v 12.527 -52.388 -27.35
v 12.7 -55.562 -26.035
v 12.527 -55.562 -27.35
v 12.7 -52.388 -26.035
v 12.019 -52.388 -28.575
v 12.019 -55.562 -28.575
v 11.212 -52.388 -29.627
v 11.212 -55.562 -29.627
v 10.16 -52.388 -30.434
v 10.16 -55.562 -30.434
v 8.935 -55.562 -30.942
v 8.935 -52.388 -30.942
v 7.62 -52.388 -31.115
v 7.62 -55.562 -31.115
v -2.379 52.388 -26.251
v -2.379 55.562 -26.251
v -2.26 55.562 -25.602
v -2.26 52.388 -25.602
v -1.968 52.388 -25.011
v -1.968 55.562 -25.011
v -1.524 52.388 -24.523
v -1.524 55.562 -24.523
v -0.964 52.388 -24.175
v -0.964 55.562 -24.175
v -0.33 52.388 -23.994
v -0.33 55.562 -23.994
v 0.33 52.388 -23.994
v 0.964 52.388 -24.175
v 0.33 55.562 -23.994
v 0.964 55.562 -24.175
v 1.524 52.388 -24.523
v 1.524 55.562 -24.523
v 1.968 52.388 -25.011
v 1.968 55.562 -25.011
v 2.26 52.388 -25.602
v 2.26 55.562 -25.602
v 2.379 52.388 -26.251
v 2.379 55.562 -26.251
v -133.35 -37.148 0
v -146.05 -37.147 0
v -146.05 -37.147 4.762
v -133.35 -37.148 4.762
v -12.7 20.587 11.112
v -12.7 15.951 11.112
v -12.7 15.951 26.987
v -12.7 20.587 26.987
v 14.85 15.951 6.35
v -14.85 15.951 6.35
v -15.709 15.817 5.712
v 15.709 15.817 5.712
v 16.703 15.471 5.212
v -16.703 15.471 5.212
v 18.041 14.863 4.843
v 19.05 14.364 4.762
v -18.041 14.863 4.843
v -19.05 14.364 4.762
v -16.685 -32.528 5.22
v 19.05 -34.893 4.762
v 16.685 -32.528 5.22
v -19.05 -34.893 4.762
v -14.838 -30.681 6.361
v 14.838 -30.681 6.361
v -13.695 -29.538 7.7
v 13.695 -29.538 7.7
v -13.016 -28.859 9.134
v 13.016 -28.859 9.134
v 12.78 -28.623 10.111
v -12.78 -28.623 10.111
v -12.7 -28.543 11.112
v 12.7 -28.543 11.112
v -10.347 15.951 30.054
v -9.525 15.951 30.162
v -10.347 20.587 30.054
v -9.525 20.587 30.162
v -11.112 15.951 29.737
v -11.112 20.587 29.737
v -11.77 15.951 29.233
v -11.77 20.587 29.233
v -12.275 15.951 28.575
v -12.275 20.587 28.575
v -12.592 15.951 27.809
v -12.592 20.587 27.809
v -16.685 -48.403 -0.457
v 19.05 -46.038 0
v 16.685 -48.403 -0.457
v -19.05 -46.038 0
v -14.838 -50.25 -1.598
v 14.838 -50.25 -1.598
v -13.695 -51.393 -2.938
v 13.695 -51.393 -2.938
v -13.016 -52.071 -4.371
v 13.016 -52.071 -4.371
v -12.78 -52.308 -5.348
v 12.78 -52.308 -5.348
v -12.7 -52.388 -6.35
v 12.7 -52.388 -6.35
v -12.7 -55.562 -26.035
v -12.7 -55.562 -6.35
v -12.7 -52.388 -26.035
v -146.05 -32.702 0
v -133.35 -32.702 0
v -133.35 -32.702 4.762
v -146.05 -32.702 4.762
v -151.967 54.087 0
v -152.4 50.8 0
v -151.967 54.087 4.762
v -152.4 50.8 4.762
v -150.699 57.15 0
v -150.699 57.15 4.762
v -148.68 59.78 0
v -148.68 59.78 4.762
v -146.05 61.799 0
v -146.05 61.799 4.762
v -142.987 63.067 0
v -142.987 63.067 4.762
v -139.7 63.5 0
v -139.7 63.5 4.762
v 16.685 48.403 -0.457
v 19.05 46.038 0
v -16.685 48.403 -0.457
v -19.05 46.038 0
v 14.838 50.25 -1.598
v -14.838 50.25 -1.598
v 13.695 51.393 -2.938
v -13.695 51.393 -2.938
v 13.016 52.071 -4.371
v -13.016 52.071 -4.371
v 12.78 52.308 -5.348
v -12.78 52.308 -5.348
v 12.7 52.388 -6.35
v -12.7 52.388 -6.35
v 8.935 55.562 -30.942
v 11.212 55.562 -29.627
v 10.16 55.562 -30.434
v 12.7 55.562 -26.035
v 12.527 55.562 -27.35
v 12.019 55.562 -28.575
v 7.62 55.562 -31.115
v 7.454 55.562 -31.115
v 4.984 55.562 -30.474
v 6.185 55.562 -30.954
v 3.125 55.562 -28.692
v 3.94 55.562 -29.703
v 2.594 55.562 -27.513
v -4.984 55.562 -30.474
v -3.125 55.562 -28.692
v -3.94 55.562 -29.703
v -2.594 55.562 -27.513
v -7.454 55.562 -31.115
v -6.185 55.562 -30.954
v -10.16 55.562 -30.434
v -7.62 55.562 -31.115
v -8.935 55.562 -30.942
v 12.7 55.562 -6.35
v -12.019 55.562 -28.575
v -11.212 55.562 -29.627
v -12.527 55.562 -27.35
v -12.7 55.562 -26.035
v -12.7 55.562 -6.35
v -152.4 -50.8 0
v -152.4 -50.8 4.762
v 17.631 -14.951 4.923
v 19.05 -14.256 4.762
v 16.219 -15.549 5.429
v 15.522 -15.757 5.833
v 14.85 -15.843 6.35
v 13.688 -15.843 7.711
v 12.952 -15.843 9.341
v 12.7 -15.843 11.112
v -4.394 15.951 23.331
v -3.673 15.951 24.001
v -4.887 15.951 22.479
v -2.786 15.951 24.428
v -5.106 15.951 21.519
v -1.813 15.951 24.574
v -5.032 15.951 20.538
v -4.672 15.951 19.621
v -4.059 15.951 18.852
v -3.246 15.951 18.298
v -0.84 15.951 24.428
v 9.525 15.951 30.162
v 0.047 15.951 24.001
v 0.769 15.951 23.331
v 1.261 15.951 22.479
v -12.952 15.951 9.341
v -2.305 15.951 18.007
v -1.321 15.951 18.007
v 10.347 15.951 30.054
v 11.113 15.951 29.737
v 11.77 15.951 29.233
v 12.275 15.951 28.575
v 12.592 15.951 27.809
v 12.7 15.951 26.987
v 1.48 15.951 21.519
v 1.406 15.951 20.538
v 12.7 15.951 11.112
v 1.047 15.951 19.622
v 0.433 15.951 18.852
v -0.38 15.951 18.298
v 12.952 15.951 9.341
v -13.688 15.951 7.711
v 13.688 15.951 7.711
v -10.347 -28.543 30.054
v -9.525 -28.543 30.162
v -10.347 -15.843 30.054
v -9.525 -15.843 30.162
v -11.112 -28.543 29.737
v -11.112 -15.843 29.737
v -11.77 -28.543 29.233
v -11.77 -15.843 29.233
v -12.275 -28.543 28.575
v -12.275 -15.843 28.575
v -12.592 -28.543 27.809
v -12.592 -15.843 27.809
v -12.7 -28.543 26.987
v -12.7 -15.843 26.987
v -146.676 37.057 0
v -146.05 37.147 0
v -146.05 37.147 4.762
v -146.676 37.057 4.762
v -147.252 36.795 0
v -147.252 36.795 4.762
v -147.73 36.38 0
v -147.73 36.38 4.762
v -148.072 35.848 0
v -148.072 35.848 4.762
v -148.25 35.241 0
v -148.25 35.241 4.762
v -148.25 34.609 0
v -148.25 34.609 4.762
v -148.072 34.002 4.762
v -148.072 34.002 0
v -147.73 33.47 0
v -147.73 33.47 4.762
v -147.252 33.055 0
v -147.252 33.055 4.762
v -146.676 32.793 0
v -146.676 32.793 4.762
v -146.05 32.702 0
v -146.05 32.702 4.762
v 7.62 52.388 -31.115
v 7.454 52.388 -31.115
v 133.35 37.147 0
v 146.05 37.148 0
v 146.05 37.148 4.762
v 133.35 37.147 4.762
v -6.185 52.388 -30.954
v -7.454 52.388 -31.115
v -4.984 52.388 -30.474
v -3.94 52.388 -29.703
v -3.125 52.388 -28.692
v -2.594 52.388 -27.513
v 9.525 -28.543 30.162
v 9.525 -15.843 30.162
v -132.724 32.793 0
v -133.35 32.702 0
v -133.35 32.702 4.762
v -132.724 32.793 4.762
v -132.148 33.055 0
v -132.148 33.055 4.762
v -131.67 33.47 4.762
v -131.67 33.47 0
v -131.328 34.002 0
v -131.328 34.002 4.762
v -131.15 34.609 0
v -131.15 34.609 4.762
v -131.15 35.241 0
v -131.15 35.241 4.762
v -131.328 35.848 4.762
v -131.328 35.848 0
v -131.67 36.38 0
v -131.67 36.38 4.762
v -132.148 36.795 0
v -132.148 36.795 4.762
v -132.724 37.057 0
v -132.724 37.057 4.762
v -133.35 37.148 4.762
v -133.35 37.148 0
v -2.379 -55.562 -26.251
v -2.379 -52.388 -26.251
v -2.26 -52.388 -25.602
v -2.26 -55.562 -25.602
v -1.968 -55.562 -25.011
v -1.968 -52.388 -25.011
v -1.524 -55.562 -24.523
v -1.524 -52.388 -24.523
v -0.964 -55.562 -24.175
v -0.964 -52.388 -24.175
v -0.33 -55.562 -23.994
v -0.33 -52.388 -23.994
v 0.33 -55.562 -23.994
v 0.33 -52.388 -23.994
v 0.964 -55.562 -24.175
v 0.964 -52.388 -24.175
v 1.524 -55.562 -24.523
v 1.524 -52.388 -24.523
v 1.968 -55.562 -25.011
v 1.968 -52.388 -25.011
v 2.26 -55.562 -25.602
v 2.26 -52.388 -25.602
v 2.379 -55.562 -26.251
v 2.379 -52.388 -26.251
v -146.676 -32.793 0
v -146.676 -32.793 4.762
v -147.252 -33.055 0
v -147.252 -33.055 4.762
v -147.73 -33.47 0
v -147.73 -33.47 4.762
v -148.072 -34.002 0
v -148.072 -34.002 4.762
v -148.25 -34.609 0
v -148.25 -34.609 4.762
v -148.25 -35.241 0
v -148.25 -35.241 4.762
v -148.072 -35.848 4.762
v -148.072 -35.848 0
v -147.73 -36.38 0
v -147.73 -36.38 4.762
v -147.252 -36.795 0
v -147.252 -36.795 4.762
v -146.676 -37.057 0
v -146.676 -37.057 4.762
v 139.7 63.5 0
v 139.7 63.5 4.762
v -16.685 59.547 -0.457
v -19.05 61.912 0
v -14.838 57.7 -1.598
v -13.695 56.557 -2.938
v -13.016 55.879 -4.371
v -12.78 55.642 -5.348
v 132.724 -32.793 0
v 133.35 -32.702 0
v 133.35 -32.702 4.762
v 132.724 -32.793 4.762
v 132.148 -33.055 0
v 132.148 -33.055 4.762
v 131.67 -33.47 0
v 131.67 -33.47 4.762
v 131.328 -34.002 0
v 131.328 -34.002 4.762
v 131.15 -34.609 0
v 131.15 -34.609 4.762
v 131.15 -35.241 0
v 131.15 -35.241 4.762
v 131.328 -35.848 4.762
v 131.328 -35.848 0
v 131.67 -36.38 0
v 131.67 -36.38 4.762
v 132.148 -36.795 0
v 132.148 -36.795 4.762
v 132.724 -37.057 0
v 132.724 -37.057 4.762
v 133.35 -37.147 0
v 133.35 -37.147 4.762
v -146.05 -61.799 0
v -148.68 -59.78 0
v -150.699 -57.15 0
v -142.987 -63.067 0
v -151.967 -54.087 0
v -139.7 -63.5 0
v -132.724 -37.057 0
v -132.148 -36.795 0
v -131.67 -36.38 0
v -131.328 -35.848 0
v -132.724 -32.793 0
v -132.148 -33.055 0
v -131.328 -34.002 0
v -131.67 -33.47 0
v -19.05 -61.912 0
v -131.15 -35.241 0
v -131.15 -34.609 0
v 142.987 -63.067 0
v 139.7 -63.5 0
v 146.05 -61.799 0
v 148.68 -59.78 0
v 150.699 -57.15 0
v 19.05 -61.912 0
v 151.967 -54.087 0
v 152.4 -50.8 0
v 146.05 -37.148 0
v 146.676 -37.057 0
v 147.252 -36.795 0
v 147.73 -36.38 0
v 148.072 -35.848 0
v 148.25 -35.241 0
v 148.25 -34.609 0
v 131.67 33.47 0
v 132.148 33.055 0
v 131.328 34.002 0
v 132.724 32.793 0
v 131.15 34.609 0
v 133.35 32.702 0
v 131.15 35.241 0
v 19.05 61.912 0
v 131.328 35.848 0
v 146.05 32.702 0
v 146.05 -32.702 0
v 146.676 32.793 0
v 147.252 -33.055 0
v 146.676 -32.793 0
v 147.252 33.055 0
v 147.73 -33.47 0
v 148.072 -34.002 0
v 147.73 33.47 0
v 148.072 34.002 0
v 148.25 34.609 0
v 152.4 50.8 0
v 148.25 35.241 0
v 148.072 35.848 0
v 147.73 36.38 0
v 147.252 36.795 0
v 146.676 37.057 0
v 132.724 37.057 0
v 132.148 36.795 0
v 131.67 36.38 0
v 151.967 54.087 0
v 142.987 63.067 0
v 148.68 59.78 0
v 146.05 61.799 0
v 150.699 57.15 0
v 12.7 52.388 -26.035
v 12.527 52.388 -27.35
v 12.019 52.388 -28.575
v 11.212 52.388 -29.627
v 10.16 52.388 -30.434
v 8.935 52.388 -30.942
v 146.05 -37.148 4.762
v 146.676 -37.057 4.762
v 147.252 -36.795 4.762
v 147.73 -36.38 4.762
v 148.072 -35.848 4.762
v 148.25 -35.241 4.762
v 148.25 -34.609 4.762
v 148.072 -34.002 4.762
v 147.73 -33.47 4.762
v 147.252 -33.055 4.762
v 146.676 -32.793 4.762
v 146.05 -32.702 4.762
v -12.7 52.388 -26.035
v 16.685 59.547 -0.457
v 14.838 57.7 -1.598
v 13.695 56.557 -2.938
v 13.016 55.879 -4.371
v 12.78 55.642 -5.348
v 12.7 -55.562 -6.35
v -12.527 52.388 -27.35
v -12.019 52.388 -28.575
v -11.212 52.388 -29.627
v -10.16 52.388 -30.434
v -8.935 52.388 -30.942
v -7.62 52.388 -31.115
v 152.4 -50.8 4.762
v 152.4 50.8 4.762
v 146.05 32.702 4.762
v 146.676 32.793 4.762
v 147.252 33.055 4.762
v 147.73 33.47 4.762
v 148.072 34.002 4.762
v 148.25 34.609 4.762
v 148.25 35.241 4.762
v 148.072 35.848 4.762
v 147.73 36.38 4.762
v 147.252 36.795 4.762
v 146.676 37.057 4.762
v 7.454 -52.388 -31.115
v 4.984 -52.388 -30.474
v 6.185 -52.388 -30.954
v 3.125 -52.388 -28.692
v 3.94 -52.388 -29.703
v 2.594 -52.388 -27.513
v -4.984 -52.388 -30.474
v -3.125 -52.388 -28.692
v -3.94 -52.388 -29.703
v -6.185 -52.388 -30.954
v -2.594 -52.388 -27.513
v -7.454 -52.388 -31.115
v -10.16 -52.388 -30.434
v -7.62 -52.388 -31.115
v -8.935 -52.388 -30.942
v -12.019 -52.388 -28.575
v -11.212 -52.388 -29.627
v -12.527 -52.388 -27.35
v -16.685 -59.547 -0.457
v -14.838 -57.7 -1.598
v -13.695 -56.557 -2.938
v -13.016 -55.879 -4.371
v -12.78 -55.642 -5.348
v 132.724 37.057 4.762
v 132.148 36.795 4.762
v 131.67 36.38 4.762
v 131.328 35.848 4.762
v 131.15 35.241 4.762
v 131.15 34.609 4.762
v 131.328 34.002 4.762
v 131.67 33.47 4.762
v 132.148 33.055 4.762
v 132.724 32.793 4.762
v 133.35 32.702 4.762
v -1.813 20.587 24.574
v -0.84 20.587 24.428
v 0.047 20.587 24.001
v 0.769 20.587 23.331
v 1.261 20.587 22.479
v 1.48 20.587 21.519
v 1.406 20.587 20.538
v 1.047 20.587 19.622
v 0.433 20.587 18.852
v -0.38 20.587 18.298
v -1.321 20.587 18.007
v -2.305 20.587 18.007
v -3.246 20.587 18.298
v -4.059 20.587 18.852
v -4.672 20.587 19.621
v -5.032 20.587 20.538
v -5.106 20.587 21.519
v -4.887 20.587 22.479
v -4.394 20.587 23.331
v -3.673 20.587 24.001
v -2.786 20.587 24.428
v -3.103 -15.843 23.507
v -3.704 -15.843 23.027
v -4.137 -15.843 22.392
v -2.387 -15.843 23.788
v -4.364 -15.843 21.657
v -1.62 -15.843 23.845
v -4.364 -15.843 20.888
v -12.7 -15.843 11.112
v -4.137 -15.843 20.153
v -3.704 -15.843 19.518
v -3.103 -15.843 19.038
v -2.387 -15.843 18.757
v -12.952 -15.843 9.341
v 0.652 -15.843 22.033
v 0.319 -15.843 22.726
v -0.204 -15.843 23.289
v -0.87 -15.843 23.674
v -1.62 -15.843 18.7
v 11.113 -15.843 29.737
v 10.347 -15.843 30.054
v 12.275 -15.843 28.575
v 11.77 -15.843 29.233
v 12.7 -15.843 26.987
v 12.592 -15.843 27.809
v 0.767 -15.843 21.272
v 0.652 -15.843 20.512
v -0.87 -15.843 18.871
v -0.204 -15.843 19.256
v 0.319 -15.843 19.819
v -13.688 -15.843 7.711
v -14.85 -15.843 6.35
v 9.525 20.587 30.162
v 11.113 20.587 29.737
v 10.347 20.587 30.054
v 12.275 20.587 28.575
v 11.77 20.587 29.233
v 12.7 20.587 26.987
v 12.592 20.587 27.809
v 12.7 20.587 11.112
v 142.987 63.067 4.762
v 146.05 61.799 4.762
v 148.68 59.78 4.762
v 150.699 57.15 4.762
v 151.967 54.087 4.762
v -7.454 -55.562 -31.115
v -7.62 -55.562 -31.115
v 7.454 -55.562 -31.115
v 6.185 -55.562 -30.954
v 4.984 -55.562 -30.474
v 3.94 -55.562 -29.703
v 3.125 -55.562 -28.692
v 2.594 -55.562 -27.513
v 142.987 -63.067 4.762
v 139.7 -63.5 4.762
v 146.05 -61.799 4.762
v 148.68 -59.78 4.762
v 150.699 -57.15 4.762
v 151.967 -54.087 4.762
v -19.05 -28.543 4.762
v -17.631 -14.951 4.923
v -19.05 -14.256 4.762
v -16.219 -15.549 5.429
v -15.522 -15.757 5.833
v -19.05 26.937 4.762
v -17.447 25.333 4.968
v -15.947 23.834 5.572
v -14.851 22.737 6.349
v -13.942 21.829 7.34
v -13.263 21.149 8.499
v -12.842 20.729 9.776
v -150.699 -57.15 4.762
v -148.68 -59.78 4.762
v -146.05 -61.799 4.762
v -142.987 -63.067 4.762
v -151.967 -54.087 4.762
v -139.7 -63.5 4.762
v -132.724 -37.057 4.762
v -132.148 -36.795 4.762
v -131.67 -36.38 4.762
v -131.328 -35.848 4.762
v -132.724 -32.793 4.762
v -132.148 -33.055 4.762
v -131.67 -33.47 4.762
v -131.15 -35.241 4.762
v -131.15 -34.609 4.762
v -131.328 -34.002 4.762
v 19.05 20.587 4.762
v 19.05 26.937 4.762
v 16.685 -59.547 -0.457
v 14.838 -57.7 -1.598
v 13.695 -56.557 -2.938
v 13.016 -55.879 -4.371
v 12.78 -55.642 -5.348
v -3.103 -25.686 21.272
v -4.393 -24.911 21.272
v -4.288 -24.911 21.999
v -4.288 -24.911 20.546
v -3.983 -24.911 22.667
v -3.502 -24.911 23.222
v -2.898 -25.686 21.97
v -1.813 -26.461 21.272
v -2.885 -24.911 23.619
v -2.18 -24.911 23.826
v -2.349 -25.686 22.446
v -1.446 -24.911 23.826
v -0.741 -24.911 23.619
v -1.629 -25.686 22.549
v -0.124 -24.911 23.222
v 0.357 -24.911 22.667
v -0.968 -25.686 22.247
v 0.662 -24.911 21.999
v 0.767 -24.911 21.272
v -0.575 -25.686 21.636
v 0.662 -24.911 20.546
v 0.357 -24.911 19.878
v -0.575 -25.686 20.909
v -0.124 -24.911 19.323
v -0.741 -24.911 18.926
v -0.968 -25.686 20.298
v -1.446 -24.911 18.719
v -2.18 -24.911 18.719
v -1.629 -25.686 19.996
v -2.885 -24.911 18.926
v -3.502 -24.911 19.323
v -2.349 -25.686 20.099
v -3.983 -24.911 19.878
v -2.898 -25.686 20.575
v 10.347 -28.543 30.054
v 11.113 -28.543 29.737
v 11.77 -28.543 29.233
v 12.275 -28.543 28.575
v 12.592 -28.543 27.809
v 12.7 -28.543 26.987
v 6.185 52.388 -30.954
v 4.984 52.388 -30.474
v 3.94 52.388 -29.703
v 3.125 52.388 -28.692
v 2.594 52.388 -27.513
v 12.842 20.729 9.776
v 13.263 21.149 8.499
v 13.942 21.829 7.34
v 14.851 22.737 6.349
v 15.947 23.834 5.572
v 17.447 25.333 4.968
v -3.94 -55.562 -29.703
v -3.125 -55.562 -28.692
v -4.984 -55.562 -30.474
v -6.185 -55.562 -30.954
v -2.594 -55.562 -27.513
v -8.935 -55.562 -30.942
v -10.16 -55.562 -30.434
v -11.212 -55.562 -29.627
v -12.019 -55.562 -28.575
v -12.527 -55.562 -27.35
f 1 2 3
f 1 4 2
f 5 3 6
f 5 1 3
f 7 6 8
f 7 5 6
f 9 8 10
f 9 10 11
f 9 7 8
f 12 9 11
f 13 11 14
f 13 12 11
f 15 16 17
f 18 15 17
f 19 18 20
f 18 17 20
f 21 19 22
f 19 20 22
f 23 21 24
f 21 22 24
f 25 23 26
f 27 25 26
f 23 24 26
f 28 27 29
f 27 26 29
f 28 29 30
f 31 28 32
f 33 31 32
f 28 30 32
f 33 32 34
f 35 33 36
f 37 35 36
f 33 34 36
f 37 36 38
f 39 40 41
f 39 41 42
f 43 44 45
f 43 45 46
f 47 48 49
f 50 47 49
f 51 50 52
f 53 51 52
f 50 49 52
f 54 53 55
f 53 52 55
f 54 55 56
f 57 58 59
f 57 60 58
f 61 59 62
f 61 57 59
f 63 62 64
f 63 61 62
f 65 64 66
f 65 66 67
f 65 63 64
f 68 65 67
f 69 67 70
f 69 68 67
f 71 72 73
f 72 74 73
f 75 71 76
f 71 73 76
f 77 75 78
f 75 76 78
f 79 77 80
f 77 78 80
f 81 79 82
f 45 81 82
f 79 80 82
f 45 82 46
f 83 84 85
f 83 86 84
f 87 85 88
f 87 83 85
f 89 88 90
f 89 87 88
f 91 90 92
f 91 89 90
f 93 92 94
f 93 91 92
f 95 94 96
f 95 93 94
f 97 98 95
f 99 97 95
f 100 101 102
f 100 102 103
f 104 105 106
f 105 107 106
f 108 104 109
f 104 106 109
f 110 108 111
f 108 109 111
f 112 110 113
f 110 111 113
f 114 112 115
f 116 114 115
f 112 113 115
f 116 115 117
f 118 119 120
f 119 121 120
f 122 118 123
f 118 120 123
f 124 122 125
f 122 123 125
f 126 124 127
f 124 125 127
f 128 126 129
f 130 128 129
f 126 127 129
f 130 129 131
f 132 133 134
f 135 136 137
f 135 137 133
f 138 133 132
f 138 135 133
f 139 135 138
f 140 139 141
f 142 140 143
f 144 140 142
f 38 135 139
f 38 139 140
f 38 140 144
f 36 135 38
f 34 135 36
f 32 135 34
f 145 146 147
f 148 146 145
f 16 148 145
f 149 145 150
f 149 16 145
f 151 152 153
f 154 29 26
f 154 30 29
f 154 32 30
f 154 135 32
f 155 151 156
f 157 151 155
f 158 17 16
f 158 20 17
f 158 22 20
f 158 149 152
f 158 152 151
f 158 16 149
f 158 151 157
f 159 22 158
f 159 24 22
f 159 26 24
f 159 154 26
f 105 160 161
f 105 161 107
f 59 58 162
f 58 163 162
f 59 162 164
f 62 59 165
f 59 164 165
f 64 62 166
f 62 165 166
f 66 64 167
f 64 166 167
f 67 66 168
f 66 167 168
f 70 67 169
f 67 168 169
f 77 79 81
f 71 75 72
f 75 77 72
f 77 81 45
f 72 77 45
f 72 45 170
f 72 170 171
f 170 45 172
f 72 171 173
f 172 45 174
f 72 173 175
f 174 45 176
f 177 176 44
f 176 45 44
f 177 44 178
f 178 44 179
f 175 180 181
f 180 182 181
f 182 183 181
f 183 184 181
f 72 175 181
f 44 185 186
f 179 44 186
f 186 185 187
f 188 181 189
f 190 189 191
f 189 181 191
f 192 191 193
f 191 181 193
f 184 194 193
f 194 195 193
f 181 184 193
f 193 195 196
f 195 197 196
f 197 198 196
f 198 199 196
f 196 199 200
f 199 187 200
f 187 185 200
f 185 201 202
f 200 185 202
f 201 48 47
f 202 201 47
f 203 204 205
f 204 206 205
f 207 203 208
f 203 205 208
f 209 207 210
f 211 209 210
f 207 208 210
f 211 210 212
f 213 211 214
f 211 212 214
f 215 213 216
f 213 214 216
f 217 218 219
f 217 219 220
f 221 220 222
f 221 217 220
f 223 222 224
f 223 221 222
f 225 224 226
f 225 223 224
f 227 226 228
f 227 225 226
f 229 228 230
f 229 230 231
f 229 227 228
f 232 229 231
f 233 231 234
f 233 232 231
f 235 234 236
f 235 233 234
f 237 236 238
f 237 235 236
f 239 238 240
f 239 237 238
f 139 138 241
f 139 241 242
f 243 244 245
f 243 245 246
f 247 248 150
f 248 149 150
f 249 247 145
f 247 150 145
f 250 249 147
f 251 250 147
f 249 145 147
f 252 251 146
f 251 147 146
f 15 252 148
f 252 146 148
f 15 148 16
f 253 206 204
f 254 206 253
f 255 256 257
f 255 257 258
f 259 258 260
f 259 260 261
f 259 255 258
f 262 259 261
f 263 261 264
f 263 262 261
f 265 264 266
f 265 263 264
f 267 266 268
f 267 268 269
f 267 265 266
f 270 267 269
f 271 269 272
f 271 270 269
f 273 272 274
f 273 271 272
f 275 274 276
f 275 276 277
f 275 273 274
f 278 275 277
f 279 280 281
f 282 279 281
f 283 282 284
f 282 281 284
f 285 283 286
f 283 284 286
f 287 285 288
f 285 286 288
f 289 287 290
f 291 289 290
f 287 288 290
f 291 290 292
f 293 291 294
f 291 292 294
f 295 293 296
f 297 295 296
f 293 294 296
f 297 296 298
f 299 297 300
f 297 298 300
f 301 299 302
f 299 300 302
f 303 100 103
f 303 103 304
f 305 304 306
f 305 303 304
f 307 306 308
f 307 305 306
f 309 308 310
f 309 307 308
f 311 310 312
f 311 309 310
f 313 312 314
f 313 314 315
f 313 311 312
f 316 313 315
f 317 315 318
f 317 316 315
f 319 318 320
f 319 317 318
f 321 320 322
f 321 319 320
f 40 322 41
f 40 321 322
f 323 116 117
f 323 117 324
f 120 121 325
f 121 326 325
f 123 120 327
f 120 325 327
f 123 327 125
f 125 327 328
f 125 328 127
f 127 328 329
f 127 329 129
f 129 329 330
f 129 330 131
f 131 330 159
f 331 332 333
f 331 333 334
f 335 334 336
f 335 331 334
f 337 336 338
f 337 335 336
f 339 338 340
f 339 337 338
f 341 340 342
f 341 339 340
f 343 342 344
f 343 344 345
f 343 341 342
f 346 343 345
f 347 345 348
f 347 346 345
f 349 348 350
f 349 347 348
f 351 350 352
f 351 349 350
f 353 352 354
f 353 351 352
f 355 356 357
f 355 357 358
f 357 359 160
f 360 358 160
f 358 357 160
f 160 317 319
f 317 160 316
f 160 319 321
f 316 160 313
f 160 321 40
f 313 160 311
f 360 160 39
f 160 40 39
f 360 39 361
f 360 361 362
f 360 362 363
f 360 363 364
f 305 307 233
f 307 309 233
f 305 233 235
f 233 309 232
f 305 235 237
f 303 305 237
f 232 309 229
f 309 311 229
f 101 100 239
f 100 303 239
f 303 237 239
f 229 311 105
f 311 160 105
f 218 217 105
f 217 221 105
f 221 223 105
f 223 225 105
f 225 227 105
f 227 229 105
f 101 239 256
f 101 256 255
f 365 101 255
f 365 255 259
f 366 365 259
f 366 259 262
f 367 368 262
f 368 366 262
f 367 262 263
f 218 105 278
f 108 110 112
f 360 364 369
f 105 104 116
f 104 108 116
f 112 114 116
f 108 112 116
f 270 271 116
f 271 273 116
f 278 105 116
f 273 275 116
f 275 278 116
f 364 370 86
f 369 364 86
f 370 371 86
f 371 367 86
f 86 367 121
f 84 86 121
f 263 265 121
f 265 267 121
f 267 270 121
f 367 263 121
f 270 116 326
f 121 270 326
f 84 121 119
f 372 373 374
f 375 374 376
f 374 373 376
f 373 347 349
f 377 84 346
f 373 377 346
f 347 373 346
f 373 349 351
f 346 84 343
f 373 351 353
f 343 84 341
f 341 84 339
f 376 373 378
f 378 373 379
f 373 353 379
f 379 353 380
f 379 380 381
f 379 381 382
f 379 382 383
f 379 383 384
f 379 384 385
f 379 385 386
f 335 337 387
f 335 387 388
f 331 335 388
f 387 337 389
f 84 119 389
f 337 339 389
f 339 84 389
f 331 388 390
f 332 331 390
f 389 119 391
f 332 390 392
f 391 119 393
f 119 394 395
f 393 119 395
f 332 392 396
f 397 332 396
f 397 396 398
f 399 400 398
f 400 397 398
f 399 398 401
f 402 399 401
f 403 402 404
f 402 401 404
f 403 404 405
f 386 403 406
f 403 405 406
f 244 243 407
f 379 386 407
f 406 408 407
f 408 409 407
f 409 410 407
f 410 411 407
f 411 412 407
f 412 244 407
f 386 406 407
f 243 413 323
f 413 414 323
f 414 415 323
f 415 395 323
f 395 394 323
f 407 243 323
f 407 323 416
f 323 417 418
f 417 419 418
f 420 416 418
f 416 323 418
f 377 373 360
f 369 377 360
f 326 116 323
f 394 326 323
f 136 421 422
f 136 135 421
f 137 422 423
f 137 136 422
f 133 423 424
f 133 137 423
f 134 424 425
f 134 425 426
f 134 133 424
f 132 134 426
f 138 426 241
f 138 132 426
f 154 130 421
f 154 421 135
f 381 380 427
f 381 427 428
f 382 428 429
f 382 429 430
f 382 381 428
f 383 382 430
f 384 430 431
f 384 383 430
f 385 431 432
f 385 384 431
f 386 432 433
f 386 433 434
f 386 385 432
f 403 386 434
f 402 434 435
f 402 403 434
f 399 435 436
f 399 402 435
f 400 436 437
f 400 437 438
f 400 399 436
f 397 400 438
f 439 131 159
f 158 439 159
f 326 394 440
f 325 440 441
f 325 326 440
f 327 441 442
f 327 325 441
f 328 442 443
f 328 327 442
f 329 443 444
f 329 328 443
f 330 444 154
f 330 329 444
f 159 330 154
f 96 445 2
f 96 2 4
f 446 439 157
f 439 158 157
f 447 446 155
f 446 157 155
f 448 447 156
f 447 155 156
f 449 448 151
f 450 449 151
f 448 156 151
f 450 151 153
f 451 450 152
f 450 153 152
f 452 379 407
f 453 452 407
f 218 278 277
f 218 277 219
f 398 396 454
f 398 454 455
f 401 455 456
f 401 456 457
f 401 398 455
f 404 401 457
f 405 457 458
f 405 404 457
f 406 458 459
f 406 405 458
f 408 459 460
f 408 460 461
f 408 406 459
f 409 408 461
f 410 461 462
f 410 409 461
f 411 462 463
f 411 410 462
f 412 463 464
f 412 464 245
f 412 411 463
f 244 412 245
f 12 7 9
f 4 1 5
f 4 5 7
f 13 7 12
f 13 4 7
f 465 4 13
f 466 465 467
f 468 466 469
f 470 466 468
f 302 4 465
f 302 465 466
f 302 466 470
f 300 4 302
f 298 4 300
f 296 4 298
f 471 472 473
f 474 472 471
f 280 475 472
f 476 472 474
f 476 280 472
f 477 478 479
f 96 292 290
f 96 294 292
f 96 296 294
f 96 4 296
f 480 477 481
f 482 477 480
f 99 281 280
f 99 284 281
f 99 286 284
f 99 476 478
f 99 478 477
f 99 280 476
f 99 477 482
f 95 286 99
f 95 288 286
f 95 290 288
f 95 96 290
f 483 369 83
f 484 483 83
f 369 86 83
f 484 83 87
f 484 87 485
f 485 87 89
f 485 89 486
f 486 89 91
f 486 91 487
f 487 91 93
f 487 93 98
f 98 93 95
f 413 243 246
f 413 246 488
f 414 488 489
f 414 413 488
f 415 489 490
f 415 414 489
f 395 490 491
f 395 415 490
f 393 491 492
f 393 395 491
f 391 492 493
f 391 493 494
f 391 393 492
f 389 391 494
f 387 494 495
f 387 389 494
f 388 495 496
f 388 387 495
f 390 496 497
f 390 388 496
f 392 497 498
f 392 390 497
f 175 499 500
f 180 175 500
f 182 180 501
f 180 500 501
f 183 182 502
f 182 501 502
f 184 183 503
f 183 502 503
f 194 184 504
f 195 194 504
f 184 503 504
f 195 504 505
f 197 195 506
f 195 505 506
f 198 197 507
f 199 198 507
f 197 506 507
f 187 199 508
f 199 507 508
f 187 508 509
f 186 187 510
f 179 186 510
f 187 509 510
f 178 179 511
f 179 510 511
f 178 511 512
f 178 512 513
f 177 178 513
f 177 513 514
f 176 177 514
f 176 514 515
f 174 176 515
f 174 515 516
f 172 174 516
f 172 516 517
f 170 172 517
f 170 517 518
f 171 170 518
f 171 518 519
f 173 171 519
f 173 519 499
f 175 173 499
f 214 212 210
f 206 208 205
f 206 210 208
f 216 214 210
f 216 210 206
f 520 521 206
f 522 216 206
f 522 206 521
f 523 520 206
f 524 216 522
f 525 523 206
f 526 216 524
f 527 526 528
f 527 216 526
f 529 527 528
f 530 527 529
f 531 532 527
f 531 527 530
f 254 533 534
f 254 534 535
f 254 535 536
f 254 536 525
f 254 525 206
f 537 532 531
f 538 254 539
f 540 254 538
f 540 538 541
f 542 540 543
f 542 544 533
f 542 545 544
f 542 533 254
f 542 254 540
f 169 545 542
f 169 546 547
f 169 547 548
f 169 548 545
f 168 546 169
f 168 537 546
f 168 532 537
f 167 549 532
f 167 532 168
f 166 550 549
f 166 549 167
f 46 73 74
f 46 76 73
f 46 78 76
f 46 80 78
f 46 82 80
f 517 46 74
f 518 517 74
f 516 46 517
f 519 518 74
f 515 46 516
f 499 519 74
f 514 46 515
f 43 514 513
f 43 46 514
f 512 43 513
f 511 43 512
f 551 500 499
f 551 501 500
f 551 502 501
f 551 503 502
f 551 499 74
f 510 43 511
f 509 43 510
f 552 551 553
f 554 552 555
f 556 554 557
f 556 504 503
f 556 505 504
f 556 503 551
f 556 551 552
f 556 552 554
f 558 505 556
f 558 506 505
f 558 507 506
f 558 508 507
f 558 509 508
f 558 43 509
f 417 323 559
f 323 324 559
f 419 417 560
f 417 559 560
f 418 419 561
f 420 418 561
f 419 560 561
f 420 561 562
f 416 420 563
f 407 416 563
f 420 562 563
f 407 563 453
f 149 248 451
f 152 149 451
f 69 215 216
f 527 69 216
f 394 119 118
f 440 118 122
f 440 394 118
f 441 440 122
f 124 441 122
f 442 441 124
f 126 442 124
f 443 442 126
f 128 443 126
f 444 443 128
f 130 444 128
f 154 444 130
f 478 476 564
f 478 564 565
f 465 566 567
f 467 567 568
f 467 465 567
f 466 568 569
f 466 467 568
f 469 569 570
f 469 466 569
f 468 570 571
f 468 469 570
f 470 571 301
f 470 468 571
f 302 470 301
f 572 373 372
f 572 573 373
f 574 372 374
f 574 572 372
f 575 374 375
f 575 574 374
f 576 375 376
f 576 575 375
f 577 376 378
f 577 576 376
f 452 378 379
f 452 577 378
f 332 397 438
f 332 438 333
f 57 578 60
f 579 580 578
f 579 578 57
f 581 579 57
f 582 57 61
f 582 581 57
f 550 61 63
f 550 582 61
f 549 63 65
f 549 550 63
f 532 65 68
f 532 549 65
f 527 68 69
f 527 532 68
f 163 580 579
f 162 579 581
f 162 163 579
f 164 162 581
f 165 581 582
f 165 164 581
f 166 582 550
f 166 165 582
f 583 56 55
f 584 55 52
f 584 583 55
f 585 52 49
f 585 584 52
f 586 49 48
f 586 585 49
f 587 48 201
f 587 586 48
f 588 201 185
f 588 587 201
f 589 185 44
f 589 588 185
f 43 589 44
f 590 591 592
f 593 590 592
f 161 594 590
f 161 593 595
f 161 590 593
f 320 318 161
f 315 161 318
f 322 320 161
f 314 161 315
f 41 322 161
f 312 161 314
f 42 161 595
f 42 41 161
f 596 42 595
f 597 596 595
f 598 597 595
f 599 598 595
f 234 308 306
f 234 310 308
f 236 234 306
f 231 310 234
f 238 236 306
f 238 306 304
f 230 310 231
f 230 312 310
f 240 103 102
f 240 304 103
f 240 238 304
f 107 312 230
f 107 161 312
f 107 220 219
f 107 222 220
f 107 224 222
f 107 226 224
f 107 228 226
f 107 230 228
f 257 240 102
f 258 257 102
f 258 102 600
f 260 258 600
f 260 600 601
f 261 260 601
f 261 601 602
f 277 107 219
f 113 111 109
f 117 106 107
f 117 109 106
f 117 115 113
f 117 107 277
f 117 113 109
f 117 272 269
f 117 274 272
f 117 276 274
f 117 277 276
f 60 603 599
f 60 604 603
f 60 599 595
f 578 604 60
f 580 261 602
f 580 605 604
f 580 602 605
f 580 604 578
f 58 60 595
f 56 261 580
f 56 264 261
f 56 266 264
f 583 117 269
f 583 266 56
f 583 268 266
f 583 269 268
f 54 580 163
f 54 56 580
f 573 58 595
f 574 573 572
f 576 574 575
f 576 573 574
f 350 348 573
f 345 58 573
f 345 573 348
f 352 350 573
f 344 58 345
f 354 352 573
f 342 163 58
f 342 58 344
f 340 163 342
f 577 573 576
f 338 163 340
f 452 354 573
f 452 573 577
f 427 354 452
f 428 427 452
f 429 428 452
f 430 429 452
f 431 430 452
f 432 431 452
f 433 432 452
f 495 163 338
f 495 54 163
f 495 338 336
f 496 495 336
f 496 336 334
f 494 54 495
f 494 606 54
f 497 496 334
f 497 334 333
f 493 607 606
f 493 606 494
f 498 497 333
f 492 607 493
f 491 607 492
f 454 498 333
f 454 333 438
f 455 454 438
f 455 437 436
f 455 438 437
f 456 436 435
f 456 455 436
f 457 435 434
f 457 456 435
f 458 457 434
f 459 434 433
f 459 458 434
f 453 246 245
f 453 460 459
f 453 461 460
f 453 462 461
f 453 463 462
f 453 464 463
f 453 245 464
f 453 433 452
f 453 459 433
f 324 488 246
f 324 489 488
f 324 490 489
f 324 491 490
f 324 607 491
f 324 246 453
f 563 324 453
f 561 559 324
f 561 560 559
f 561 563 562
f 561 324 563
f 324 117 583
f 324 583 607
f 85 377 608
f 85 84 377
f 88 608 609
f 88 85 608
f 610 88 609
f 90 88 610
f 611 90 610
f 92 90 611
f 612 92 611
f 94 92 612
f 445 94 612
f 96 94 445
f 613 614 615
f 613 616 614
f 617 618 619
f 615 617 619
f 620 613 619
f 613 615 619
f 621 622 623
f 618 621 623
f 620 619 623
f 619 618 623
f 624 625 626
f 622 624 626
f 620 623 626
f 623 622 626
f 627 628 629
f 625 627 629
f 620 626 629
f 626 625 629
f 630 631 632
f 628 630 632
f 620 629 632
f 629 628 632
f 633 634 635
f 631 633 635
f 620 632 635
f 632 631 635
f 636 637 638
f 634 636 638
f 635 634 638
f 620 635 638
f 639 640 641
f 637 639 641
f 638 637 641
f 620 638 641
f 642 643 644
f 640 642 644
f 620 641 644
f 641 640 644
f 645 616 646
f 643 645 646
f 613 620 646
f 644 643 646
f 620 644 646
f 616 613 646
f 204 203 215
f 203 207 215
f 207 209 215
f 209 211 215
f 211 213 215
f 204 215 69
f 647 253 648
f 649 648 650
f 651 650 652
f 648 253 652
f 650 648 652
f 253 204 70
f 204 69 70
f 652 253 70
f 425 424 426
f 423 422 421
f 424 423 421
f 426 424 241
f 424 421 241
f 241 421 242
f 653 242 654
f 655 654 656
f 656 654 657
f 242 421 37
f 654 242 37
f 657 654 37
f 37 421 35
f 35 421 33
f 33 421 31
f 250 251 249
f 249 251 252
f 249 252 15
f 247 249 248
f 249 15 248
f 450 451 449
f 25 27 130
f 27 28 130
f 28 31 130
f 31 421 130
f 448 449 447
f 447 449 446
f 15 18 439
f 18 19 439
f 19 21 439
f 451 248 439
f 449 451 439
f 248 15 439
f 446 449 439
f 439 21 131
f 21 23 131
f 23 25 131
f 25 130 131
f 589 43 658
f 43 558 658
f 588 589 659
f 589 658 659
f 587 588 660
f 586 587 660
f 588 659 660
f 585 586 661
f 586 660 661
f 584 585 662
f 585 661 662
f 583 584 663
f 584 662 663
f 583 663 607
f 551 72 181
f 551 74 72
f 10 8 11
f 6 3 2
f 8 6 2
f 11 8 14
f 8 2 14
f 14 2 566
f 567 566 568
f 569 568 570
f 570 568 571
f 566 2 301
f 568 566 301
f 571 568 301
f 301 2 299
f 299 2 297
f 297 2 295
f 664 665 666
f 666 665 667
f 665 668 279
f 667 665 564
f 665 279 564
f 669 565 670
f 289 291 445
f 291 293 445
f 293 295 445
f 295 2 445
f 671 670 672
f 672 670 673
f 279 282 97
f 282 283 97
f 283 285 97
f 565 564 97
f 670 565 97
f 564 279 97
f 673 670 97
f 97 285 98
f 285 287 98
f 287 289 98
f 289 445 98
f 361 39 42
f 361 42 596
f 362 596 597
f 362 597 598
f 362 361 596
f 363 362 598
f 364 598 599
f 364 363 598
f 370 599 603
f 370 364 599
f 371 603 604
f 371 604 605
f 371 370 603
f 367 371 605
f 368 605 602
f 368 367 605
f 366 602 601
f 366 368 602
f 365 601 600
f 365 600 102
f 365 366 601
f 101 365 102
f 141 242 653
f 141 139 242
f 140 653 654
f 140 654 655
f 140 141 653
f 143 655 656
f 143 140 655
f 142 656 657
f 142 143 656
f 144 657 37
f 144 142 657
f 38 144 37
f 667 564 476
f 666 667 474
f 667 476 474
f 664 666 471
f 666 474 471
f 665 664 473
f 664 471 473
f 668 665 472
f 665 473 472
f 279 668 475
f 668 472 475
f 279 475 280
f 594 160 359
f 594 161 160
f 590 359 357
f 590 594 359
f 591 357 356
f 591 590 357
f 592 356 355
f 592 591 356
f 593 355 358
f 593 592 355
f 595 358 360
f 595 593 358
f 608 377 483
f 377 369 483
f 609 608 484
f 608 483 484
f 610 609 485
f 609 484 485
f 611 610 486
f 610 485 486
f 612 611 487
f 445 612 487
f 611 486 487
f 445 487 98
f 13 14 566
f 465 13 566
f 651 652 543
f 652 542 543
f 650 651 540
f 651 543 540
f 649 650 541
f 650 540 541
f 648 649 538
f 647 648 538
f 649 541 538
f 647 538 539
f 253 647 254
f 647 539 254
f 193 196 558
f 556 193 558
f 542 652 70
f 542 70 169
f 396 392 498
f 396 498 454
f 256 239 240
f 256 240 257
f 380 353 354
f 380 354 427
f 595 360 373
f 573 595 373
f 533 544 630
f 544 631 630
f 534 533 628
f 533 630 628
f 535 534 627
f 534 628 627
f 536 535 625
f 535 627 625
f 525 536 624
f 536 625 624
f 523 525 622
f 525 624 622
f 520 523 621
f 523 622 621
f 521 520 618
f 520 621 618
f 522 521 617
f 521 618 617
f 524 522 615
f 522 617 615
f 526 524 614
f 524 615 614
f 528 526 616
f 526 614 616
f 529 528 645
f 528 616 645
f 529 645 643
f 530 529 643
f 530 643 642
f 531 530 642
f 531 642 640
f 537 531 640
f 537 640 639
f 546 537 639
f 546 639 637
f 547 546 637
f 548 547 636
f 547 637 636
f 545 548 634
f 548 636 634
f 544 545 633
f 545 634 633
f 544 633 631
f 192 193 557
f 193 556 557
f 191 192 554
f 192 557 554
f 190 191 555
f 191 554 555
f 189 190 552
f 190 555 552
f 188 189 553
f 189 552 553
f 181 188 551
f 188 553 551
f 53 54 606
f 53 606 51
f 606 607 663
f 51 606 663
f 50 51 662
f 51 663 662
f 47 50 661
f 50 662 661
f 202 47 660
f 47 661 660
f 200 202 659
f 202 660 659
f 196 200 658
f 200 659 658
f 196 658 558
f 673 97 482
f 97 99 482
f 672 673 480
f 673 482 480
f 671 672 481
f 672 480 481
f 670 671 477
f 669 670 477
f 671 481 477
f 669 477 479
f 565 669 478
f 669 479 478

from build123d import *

# Parameters (mm, degrees)
SKETCH1_W                            = 304.8
SKETCH1_H                            = 127
BOSS_EXTRUDE1_DEPTH                  = 4.7625
SKETCH2_W                            = 25.4
SKETCH2_H                            = 3.175
BOSS_EXTRUDE2_DEPTH                  = 31.115
CUT_EXTRUDE1_DEPTH                   = 63.5
FILLET1_R                            = 5.08
FILLET2_R                            = 12.7
FILLET4_R                            = 6.35
CUT_EXTRUDE2_DEPTH                   = 4.7625
LPATTERN2_COUNT                      = 2
LPATTERN2_PITCH                      = 279.4
LPATTERN2_COUNT_DIR2                 = 2
LPATTERN2_PITCH_DIR2                 = 69.85
SKETCH8_W                            = 25.4
SKETCH8_H                            = 12.7
SKETCH8_H_2                          = 4.6355
BOSS_EXTRUDE3_DEPTH                  = 25.4
CUT_EXTRUDE3_REACH                   = 86.087
SKETCH9_R                            = 3.302
F_13_64_0_20313_DIAMETER_HOLE1_D     = 5.159502
F_13_64_0_20313_DIAMETER_HOLE1_DEPTH = 9.0678
F_13_64_0_20313_DIAMETER_HOLE1_TIP   = 1.550070783
FILLET5_R                            = 6.35
FILLET6_R                            = 3.175
FILLET7_R                            = 1.5875
FILLET11_R                           = 6.35


with BuildPart() as part:
    # Sketch1 → Boss-Extrude1 (new body)
    with BuildSketch(Plane.XY):
        Rectangle(SKETCH1_W, SKETCH1_H)
    extrude(amount=BOSS_EXTRUDE1_DEPTH)

    # Sketch2 → Boss-Extrude2 (add)
    with BuildSketch(Plane(origin=(0, 0, 0), x_dir=(-1, 0, 0), z_dir=(0, 0, -1))):
        with Locations((0, 53.975)):
            Rectangle(SKETCH2_W, SKETCH2_H)
        with Locations((0, -53.975)):
            Rectangle(SKETCH2_W, SKETCH2_H)
    extrude(amount=BOSS_EXTRUDE2_DEPTH)

    # Sketch3 → Cut-Extrude1 (cut, symmetric)
    with BuildSketch(Plane(origin=(0, 0, 0), x_dir=(1, 0, 0), z_dir=(0, 1, 0))):
        with BuildLine():
            Line((2.38125, 26.3525), (2.38125, 31.115))
            Line((2.38125, 31.115), (-2.38125, 31.115))
            Line((-2.38125, 31.115), (-2.38125, 26.3525))
            ThreePointArc((-2.38125, 26.3525), (0, 23.97125), (2.38125, 26.3525))
        make_face()
    extrude(amount=CUT_EXTRUDE1_DEPTH, both=True, mode=Mode.SUBTRACT)

    # Fillet1
    fillet1_edges = [part.edges().sort_by_distance(p)[0] for p in [
        (-2.38125, -53.975, -31.115),
        (2.38125, -53.975, -31.115),
        (-2.38125, 53.975, -31.115),
        (2.38125, 53.975, -31.115),
        (12.7, -53.975, -31.115),
        (-12.7, -53.975, -31.115),
        (-12.7, 53.975, -31.115),
        (12.7, 53.975, -31.115),
    ]]
    fillet(fillet1_edges, radius=FILLET1_R)

    # Fillet2
    fillet2_edges = [part.edges().sort_by_distance(p)[0] for p in [
        (-152.4, 63.5, 2.38125),
        (152.4, 63.5, 2.38125),
        (152.4, -63.5, 2.38125),
        (-152.4, -63.5, 2.38125),
    ]]
    fillet(fillet2_edges, radius=FILLET2_R)

    # Fillet4
    fillet4_edges = [part.edges().sort_by_distance(p)[0] for p in [
        (12.7, 53.975, 0),
        (0, 52.3875, 0),
        (-12.7, 53.975, 0),
        (0, 55.5625, 0),
        (0, -52.3875, 0),
        (12.7, -53.975, 0),
        (0, -55.5625, 0),
        (-12.7, -53.975, 0),
    ]]
    fillet(fillet4_edges, radius=FILLET4_R)

    # Sketch7 → Cut-Extrude2 (cut)
    with BuildSketch(Plane(origin=(0, 0, 0), x_dir=(-1, 0, 0), z_dir=(0, 0, -1))):
        with BuildLine():
            Line((-146.05, 37.1475), (-133.35, 37.1475))
            ThreePointArc((-133.35, 37.1475), (-131.1275, 34.925), (-133.35, 32.7025))
            Line((-133.35, 32.7025), (-146.05, 32.7025))
            ThreePointArc((-146.05, 32.7025), (-148.2725, 34.925), (-146.05, 37.1475))
        make_face()
    cut_extrude2 = extrude(amount=-CUT_EXTRUDE2_DEPTH, mode=Mode.SUBTRACT)

    # LPattern2: Cut-Extrude2 2 × 2
    with Locations(*[(-i * LPATTERN2_PITCH, -j * LPATTERN2_PITCH_DIR2, 0) for i in range(LPATTERN2_COUNT) for j in range(LPATTERN2_COUNT_DIR2) if (i, j) != (0, 0)]):
        add(cut_extrude2, mode=Mode.SUBTRACT)

    # Sketch8 → Boss-Extrude3 (add)
    with BuildSketch(Plane.XY.offset(4.7625)):
        with Locations((0, -22.19325)):
            Rectangle(SKETCH8_W, SKETCH8_H)
        with Locations((0, 18.26895)):
            Rectangle(SKETCH8_W, SKETCH8_H_2)
    extrude(amount=BOSS_EXTRUDE3_DEPTH)

    # Sketch9 → Cut-Extrude3 (cut, up to next)
    with BuildSketch(Plane(origin=(0, 20.5867, 0), x_dir=(1, 0, 0), z_dir=(0, 1, 0)), mode=Mode.PRIVATE) as cut_extrude3_sk1:
        with Locations(Location((-1.812874351, -21.2725, 0), (0, 0, 270))):  # turned: the seam where the file's is
            Circle(SKETCH9_R)
    cut_extrude3_tool1 = extrude(cut_extrude3_sk1.sketch, amount=-CUT_EXTRUDE3_REACH, mode=Mode.PRIVATE) & part.part
    add(cut_extrude3_tool1.solids().sort_by_distance((-1.812874, 20.5867, 21.2725))[0], mode=Mode.SUBTRACT)

    # 13/64 (0.20313) Diameter Hole1
    with Locations(Plane(origin=(0, -15.84325, 0), x_dir=(-1, 0, 0), z_dir=(0, 1, 0))):
        with Locations((1.812886138, 21.2725)):
            Hole(F_13_64_0_20313_DIAMETER_HOLE1_D / 2, depth=F_13_64_0_20313_DIAMETER_HOLE1_DEPTH)
            with Locations((0, 0, -(F_13_64_0_20313_DIAMETER_HOLE1_DEPTH + F_13_64_0_20313_DIAMETER_HOLE1_TIP / 2))):  # 118° drill point
                Cone(0, F_13_64_0_20313_DIAMETER_HOLE1_D / 2, F_13_64_0_20313_DIAMETER_HOLE1_TIP, mode=Mode.SUBTRACT)

    # Fillet5
    fillet5_edges = [part.edges().sort_by_distance(p)[0] for p in [
        (-12.7, -22.19325, 4.7625),
        (12.7, -22.19325, 4.7625),
        (-12.7, 18.26895, 4.7625),
        (12.7, 18.26895, 4.7625),
    ]]
    fillet(fillet5_edges, radius=FILLET5_R)

    # Fillet6
    fillet6_edges = [part.edges().sort_by_distance(p)[0] for p in [
        (-12.7, -22.19325, 30.1625),
        (12.7, -22.19325, 30.1625),
        (-12.7, 18.26895, 30.1625),
        (12.7, 18.26895, 30.1625),
    ]]
    fillet(fillet6_edges, radius=FILLET6_R)

    # Fillet7
    fillet7_edges = [part.edges().sort_by_distance(p)[0] for p in [
        (0, -15.84325, 4.7625),
        (0, 15.9512, 4.7625),
    ]]
    fillet(fillet7_edges, radius=FILLET7_R)

    # Fillet11
    fillet11_edges = [part.edges().sort_by_distance(p)[0] for p in [
        (0, -28.54325, 4.7625),
        (0, 20.5867, 4.7625),
    ]]
    fillet(fillet11_edges, radius=FILLET11_R)


solid = part.part
